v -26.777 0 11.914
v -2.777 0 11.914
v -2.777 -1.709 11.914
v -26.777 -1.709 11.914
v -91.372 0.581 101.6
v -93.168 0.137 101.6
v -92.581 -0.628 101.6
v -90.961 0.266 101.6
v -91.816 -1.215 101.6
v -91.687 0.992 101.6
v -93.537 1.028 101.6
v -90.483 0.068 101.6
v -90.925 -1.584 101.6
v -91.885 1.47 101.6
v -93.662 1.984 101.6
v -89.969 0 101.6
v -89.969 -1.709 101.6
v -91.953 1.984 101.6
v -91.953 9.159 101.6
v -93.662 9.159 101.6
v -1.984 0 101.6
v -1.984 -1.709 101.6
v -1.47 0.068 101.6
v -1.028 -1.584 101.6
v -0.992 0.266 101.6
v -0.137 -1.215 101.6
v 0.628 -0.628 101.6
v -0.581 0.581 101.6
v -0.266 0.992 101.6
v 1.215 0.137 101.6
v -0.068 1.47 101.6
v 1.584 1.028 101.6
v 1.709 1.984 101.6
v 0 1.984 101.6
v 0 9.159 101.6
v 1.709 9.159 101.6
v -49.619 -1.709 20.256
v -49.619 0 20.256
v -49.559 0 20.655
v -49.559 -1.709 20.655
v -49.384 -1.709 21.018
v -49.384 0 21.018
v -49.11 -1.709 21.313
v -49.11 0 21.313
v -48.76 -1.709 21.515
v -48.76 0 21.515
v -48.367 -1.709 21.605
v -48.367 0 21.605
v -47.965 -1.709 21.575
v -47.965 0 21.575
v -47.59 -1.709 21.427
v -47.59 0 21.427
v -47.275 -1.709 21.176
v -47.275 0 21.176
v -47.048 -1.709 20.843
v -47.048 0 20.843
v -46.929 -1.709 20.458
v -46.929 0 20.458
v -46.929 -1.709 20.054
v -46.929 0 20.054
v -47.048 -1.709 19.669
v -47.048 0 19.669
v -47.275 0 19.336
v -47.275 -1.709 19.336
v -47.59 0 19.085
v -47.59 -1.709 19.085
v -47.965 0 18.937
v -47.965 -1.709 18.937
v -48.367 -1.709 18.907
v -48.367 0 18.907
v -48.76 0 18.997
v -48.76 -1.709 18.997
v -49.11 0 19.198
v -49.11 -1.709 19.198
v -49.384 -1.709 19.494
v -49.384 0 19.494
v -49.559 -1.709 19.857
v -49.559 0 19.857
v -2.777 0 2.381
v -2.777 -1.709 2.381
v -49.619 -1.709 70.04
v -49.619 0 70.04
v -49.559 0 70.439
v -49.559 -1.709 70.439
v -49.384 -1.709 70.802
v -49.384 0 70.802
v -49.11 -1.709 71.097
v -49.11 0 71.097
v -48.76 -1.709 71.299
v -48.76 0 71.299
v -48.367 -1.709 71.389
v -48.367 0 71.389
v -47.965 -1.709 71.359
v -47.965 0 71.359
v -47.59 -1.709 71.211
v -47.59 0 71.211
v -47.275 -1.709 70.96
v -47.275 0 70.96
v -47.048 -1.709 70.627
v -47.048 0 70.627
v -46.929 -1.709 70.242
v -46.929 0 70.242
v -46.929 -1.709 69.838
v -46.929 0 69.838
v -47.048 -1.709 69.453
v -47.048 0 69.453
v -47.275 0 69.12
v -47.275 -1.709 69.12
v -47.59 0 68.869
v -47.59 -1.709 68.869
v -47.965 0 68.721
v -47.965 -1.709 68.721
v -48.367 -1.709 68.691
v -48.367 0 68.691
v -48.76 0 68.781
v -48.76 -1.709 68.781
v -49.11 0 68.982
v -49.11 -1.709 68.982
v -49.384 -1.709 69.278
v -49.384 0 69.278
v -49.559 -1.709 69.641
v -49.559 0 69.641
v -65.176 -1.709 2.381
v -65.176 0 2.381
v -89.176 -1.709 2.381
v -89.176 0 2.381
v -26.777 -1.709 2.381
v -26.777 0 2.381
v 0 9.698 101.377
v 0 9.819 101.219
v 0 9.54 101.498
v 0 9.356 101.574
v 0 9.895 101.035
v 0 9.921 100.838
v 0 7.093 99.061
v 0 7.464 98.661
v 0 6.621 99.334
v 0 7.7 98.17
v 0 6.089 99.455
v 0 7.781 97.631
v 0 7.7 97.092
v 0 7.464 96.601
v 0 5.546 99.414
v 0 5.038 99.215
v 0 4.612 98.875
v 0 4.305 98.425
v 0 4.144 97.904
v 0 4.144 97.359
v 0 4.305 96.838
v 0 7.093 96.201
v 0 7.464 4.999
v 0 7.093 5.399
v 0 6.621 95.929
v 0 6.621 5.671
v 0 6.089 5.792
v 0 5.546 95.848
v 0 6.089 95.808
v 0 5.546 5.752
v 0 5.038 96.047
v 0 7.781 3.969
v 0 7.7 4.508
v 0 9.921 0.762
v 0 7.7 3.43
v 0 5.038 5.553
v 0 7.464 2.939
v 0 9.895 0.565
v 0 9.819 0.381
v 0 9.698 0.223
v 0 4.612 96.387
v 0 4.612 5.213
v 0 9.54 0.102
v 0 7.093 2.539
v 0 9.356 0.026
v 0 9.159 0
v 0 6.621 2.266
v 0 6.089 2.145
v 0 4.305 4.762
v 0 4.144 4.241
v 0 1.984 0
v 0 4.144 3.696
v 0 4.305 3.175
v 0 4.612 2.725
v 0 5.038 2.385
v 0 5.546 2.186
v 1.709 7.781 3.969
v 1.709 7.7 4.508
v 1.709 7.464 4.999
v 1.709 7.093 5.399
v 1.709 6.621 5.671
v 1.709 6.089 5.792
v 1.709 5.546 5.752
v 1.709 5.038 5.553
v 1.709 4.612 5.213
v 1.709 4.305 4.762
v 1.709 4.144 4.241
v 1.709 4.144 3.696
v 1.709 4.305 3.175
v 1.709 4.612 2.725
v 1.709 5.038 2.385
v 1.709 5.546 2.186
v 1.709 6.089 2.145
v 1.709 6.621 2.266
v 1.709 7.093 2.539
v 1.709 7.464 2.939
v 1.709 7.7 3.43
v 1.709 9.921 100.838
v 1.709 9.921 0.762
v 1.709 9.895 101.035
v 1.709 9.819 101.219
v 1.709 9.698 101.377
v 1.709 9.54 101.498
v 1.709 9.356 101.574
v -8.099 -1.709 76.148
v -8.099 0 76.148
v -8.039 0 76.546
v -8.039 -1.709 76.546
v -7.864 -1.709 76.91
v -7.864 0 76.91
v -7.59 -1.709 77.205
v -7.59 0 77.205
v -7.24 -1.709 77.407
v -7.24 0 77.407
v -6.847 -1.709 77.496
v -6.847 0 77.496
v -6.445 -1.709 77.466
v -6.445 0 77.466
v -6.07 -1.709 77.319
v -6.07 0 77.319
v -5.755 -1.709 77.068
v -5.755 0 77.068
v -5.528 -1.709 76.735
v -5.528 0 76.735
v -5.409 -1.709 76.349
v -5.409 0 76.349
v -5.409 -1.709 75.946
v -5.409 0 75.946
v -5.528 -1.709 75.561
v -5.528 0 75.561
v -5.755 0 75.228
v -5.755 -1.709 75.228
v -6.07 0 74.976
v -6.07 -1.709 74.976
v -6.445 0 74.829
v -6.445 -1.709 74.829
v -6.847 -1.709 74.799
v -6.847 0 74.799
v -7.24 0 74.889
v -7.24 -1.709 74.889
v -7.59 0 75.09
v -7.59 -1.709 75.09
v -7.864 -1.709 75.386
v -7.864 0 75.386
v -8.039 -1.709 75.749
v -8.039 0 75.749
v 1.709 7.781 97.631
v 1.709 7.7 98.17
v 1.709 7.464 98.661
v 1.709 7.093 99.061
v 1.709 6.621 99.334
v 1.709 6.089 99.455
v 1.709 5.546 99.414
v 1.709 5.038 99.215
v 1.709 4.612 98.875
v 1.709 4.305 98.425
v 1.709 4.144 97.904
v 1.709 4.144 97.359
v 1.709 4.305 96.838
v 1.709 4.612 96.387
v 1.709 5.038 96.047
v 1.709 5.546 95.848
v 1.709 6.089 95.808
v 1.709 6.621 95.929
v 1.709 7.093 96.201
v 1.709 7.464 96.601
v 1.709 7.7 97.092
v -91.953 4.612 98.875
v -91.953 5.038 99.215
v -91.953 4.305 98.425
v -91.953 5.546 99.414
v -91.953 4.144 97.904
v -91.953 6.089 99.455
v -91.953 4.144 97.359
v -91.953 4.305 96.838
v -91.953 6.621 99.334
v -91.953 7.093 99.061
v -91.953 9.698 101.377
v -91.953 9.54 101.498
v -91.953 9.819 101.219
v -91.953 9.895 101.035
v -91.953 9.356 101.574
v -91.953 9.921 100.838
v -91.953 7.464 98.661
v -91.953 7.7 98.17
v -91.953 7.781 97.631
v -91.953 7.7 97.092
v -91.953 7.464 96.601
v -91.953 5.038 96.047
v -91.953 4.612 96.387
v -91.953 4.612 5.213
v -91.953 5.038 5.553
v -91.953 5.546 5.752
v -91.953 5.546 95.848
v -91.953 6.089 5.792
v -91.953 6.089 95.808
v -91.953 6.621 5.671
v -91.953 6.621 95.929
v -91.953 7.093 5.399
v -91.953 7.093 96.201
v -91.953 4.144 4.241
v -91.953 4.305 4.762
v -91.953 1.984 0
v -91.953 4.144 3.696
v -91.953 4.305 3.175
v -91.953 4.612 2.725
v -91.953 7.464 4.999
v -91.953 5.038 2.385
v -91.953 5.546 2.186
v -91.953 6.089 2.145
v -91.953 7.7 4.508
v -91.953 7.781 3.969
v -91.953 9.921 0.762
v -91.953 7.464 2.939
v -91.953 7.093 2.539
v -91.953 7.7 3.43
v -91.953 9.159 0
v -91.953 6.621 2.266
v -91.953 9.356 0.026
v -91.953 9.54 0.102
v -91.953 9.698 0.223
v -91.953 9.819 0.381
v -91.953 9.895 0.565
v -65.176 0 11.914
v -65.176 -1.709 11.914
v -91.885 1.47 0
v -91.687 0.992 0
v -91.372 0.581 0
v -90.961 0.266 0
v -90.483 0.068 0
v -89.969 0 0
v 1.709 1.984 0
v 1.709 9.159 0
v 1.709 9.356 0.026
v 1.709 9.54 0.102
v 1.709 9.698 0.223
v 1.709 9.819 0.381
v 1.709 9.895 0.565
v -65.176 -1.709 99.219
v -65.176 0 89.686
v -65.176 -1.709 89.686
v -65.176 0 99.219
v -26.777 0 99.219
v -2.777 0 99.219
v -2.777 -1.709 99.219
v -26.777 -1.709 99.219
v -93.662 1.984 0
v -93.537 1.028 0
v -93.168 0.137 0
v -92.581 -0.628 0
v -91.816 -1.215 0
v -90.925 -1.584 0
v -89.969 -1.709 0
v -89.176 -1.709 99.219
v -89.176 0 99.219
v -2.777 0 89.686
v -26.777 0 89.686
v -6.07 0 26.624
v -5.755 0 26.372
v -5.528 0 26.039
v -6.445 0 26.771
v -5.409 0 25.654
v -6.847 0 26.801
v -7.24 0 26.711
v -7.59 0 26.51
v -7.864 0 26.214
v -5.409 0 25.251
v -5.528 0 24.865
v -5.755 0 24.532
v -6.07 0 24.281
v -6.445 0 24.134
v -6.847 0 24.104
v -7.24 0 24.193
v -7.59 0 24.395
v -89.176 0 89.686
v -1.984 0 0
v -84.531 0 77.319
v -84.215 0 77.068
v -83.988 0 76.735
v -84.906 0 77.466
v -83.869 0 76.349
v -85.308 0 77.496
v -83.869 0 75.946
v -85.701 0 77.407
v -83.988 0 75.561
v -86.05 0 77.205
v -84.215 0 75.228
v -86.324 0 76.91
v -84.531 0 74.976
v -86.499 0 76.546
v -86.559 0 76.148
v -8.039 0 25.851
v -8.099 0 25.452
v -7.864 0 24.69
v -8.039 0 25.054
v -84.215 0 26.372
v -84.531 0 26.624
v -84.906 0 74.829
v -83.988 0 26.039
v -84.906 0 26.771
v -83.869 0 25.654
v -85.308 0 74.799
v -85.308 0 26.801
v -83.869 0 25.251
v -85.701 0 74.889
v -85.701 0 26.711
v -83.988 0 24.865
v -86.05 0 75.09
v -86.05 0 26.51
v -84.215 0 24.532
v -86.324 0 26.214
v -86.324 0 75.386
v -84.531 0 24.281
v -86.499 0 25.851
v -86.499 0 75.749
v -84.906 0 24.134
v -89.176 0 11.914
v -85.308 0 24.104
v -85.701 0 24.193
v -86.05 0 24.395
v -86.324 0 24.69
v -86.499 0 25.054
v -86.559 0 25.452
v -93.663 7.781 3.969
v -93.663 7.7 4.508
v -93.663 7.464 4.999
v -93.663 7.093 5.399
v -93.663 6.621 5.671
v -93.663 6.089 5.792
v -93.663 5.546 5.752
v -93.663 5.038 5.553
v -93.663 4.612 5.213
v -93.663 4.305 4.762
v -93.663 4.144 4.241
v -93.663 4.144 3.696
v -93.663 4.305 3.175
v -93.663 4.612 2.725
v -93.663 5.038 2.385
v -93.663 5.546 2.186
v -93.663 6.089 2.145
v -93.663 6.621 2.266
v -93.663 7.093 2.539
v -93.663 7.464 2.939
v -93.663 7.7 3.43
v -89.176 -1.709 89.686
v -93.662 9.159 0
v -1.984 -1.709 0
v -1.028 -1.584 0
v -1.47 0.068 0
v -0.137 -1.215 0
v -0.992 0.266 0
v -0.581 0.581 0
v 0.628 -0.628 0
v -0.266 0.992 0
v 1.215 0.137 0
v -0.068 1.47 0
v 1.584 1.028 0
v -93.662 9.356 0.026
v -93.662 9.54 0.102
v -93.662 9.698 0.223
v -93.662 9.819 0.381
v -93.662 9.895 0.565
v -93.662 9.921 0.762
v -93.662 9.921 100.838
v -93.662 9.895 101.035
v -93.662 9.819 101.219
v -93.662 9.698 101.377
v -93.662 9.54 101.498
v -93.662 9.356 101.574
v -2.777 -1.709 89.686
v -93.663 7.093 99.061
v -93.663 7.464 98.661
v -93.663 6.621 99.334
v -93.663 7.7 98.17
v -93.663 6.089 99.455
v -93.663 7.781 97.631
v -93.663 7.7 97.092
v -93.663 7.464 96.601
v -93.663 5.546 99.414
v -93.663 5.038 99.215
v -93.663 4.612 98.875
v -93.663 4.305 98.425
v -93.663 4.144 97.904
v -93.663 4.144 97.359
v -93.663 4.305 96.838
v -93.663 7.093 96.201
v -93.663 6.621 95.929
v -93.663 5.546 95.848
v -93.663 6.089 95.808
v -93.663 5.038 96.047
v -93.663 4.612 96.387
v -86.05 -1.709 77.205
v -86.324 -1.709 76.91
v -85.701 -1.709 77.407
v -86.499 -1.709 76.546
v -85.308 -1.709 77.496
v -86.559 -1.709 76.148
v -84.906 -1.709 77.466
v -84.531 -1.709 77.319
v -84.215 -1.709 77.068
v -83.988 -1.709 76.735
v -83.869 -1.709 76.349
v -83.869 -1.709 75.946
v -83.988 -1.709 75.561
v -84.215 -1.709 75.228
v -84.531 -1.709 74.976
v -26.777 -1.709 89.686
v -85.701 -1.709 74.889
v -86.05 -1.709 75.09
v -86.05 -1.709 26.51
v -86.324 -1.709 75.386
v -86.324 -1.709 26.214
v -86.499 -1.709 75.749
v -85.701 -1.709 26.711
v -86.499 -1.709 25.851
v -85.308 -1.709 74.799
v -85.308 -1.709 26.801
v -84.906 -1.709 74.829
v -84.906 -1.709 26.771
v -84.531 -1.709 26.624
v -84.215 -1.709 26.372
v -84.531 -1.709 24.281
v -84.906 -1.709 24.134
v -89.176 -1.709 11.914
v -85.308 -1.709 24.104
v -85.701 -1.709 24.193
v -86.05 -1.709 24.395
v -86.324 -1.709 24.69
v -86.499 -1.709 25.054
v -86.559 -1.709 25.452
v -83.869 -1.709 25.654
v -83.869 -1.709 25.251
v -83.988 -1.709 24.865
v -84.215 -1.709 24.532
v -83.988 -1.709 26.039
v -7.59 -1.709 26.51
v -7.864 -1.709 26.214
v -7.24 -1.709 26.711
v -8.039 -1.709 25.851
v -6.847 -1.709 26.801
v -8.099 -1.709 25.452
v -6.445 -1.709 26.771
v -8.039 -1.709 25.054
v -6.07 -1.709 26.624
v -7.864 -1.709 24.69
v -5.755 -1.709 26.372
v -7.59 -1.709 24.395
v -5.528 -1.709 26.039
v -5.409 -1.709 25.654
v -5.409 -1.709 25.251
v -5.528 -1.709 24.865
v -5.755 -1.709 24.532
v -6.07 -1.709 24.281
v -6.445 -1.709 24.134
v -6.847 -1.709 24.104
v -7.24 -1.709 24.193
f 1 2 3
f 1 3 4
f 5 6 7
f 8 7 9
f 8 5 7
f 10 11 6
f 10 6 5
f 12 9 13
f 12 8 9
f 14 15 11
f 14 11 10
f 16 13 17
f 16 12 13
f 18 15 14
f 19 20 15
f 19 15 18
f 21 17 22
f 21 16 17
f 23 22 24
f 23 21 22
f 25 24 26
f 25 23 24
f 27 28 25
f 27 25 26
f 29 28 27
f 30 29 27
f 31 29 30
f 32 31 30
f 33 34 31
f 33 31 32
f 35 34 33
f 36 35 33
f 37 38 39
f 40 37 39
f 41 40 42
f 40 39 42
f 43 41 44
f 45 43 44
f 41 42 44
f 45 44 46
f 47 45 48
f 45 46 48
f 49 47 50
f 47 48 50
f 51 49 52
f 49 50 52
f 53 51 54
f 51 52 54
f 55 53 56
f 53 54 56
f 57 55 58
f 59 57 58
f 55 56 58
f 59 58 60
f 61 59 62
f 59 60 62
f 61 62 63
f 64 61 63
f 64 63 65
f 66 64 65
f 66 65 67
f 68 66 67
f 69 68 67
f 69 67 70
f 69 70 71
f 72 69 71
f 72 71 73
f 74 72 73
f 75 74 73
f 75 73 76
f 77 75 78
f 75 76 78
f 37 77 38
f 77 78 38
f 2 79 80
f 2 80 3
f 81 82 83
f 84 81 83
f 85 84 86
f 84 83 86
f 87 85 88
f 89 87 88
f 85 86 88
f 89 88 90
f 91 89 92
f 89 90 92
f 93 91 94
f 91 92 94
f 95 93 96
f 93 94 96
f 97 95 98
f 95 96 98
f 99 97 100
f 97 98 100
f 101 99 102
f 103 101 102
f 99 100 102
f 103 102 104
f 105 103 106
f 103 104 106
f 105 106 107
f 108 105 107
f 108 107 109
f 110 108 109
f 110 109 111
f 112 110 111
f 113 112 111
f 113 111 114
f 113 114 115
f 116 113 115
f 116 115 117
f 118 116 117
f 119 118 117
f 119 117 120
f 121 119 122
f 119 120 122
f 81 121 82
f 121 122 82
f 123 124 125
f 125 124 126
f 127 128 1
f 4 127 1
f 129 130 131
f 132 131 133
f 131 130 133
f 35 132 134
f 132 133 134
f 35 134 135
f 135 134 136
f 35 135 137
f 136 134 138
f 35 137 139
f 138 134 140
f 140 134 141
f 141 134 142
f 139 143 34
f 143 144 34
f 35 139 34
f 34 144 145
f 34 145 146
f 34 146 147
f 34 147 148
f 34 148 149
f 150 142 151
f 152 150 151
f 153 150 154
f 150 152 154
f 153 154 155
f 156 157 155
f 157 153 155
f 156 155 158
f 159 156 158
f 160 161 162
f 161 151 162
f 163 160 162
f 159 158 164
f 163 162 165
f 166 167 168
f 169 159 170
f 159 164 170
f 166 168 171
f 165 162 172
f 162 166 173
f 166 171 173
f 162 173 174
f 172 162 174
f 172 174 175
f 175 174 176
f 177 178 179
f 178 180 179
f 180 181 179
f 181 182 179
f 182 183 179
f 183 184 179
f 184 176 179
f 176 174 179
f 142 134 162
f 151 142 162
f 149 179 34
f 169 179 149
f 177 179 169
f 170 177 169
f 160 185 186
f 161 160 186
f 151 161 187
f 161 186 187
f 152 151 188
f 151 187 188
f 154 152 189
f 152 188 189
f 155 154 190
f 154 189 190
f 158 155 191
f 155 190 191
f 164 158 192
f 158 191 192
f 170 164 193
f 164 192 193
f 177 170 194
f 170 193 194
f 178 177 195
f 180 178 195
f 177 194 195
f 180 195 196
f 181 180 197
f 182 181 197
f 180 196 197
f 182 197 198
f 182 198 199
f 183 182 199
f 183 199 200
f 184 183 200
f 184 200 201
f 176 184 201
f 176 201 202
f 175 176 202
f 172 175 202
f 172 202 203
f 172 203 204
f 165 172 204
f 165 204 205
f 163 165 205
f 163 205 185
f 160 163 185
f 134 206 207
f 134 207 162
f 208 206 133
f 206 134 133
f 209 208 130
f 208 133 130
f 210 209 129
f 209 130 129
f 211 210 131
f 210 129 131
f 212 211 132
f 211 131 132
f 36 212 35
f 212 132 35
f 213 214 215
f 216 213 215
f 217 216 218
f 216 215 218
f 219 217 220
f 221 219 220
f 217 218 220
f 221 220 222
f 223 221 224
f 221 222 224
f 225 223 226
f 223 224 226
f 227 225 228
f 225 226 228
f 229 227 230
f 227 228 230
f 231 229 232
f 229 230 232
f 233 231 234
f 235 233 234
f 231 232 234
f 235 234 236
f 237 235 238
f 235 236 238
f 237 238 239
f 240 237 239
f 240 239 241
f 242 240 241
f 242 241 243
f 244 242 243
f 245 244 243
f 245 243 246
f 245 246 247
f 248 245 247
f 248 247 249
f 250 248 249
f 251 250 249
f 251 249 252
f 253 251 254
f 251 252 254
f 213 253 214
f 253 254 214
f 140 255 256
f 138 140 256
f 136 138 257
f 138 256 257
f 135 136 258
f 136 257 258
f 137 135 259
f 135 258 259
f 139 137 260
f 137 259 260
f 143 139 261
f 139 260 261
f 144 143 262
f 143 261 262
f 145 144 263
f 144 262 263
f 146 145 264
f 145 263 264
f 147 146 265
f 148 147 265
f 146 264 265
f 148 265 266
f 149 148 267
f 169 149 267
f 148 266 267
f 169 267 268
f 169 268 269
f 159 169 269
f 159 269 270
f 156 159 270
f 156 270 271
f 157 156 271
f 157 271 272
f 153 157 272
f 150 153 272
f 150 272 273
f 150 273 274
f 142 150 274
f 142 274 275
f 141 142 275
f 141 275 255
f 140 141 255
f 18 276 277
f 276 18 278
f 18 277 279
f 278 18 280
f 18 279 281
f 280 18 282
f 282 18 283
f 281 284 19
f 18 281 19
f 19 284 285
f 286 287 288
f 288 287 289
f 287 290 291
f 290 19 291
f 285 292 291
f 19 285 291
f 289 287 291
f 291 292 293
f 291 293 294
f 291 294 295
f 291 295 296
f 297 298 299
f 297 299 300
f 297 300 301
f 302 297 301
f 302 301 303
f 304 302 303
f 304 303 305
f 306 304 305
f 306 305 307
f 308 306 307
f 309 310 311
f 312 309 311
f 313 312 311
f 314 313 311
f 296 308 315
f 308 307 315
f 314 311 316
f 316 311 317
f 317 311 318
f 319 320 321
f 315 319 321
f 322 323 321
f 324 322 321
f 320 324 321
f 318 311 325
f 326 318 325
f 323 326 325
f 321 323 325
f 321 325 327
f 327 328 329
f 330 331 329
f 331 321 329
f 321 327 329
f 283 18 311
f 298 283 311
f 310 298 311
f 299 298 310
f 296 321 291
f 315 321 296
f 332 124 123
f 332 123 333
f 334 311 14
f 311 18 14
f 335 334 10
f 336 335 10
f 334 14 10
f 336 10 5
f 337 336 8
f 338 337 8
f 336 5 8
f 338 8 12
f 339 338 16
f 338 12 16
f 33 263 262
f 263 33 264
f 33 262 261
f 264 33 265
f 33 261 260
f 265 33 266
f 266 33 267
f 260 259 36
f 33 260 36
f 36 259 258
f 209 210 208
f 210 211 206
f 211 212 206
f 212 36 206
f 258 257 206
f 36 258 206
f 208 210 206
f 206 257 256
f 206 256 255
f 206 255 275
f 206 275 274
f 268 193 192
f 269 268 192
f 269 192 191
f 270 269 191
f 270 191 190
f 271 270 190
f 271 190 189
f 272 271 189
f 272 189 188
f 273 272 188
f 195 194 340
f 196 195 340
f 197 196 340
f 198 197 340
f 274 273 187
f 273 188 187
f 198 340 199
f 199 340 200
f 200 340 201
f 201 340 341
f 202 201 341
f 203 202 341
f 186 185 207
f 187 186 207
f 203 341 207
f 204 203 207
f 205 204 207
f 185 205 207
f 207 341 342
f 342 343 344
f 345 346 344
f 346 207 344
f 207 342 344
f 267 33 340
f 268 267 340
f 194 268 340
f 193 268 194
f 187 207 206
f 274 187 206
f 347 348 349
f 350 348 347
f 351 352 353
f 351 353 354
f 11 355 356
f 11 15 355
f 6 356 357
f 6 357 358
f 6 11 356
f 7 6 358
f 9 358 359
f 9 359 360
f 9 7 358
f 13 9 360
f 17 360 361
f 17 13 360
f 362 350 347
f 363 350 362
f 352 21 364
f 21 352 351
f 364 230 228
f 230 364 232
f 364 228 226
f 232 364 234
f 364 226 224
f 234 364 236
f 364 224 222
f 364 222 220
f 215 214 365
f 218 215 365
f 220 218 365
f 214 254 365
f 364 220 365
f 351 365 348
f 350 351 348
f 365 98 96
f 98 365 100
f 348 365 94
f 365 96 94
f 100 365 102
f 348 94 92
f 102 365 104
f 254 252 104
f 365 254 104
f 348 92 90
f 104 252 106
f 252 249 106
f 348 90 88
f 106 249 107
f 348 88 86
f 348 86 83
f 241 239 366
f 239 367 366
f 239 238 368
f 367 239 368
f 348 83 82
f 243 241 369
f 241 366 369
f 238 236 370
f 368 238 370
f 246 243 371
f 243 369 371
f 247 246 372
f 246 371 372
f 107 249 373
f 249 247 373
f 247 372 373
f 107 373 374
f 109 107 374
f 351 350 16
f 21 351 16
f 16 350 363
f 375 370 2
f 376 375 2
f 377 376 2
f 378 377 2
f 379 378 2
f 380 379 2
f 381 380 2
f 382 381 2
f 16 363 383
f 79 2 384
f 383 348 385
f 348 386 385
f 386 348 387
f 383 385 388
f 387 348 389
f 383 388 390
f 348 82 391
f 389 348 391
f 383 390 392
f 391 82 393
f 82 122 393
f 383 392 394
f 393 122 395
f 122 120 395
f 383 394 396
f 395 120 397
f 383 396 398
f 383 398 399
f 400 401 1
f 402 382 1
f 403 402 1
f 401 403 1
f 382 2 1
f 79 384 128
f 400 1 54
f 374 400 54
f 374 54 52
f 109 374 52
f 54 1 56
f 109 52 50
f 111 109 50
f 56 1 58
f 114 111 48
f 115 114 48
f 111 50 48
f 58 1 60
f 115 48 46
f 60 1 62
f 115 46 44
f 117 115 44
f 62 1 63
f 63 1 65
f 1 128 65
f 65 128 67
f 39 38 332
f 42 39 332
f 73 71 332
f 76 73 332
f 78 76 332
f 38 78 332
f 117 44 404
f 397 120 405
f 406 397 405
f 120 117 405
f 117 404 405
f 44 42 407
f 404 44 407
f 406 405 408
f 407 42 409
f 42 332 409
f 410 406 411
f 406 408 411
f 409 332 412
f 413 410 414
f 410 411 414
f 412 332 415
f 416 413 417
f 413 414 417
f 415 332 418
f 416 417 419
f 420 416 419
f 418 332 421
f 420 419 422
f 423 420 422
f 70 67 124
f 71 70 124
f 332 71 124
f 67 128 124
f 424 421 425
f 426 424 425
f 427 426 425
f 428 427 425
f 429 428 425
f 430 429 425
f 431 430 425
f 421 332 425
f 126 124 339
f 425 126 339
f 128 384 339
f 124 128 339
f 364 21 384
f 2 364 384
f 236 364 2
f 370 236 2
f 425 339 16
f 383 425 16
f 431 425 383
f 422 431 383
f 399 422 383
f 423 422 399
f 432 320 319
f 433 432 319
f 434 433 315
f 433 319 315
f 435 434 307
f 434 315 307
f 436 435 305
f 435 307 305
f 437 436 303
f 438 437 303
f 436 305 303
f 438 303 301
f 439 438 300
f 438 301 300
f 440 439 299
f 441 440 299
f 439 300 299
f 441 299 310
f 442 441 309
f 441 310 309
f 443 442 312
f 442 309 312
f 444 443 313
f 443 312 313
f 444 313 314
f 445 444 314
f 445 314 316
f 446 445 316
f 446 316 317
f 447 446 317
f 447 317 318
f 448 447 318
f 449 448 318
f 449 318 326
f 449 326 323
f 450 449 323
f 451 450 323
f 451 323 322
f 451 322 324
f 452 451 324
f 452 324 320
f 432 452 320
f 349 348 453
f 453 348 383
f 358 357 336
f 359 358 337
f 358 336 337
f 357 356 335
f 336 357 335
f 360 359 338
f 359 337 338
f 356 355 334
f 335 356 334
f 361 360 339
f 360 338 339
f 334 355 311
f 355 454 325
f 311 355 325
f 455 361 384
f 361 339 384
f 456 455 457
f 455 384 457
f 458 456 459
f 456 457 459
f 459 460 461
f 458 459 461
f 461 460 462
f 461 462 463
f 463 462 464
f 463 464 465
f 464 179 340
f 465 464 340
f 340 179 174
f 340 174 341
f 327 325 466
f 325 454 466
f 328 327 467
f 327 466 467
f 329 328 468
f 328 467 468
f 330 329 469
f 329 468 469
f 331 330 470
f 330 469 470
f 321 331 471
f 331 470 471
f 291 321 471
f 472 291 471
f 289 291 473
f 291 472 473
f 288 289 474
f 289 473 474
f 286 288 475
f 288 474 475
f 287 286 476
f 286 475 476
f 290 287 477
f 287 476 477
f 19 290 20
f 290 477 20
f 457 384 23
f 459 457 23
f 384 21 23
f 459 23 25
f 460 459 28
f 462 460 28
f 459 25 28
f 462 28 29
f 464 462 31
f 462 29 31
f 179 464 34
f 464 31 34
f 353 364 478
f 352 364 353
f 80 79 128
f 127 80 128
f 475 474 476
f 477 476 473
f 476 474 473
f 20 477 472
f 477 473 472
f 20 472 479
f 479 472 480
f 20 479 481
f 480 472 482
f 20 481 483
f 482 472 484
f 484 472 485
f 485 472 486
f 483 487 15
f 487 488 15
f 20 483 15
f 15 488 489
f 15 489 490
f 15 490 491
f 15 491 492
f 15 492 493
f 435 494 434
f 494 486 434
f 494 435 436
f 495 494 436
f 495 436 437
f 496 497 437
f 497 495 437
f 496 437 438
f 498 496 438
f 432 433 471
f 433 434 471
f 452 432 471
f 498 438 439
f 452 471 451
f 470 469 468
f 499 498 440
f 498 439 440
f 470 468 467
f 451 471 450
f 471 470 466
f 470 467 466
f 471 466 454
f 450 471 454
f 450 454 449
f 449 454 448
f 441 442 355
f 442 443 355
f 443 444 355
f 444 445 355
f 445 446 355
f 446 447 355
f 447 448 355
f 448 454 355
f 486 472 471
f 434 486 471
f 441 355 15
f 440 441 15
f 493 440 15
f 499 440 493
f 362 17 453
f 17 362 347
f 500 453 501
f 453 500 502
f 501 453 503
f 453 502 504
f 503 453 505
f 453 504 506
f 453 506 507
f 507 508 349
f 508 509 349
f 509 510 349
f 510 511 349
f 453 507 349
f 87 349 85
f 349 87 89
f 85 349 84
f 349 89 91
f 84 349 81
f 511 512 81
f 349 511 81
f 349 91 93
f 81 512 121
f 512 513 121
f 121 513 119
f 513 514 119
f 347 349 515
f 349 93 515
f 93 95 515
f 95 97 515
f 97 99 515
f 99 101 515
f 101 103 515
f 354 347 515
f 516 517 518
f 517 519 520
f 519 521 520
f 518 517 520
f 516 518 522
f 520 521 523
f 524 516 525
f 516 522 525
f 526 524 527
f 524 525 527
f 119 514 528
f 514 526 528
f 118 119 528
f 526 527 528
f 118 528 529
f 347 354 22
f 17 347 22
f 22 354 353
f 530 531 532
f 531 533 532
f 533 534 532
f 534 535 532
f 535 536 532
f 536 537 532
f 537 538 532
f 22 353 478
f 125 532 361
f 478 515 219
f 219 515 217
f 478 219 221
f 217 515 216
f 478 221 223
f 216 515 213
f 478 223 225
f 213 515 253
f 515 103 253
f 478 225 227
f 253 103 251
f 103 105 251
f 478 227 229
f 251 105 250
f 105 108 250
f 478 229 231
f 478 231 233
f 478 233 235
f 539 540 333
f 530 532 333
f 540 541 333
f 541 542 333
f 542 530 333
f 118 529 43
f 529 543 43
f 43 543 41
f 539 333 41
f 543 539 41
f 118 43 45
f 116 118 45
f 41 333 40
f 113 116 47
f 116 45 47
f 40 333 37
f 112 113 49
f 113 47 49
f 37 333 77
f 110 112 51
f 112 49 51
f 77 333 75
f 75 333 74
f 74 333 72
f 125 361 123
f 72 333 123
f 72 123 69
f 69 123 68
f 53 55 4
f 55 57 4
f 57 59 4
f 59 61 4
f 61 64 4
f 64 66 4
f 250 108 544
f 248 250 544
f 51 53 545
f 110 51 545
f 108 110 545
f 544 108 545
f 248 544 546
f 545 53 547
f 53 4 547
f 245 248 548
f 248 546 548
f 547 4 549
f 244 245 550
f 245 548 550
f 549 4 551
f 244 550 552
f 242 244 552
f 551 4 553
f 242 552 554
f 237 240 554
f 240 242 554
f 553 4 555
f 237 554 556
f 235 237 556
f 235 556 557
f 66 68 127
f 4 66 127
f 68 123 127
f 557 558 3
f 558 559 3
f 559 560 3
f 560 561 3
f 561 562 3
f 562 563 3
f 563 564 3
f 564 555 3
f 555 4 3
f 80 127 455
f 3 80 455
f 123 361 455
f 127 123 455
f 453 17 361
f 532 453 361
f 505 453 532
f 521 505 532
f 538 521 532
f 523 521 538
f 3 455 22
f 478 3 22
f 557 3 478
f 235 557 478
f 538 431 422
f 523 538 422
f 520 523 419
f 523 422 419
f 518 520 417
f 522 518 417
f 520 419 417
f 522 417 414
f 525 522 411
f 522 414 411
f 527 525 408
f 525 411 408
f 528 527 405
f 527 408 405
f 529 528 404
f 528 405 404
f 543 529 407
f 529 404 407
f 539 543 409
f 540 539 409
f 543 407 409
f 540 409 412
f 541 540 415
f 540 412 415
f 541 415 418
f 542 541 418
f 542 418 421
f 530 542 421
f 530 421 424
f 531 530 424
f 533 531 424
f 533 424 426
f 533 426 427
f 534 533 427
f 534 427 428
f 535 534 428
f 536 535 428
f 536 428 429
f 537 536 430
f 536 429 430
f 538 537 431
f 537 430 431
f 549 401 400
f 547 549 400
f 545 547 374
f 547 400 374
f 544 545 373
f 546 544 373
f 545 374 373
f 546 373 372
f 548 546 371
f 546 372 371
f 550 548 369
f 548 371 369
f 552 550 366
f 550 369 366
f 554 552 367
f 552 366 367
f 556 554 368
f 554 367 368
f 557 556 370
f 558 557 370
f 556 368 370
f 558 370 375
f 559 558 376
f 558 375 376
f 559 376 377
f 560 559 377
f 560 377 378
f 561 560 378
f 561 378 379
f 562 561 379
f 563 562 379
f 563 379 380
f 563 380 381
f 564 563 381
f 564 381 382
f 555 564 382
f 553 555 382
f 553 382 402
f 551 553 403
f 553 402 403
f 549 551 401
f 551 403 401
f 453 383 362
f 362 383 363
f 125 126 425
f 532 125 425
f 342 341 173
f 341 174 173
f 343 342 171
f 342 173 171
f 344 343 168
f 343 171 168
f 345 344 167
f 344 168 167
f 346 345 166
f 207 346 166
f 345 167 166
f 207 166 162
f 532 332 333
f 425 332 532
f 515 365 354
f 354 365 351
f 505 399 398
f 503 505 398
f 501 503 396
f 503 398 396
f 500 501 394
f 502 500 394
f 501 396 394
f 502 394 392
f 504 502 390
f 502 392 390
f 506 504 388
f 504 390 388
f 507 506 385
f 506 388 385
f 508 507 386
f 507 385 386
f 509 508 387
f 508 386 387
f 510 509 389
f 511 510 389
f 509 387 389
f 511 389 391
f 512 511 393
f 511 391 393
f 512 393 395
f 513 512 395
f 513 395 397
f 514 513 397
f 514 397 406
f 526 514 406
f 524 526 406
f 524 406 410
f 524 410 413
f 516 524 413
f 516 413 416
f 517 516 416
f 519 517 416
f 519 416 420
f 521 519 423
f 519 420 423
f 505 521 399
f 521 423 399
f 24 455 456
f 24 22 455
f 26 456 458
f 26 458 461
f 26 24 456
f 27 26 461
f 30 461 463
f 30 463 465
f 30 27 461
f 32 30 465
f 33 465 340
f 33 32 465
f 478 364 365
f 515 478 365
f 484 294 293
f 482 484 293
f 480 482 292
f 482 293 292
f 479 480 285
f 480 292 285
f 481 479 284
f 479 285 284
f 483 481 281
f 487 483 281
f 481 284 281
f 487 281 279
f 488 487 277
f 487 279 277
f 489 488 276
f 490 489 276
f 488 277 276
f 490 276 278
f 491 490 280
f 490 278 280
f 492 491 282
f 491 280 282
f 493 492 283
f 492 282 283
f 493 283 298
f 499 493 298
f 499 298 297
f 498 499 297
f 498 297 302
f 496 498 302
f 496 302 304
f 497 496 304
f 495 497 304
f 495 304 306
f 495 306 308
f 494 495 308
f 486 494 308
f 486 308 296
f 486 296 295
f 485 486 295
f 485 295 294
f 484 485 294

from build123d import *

# Parameters (mm, degrees)
F1_DEPTH  = 101.6
F2_R      = 3.69316
F3_R      = 1.98374
F4_W      = 24
F4_H      = 9.5329248
F4_R      = 1.35255
F5_DEPTH  = 1.70942
F6_R      = 1.8288
F7_DEPTH  = 95.37192
F8_R      = 0.762
F9_R      = 1.35255
F10_DEPTH = 1.70942


with BuildPart() as f1:
    # F0 (on Top) → F1 (new body)
    with BuildSketch(Plane.XY):
        Polygon((0, 9.92124), (0, 0), (-91.95308, 0), (-91.95308, 9.92124), (-93.6625, 9.92124), (-93.6625, -1.70942), (1.70942, -1.70942), (1.70942, 9.92124), align=None)
    extrude(amount=F1_DEPTH)

    # F2
    f2_edges = [f1.edges().sort_by_distance(p)[0] for p in [
        (1.70942, -1.70942, 50.8),
        (-93.6625, -1.70942, 50.8),
    ]]
    fillet(f2_edges, radius=F2_R)

    # F3
    f3_edges = [f1.edges().sort_by_distance(p)[0] for p in [
        (0, 0, 50.8),
        (-91.95308, 0, 50.8),
    ]]
    fillet(f3_edges, radius=F3_R)

    # F4 (on face) → F5 (cut, through all)
    with BuildSketch(Plane(origin=(0, 0, 0), x_dir=(-1, 0, 0), z_dir=(0, 1, 0))):
        with Locations((77.17559, 94.4522876)):
            Rectangle(F4_W, F4_H)
        with Locations((77.17559, 7.1477124)):
            Rectangle(F4_W, F4_H)
        with Locations((14.77749, 7.1477124)):
            Rectangle(F4_W, F4_H)
        with Locations((14.77749, 94.4522876)):
            Rectangle(F4_W, F4_H)
        with Locations((85.20684, 76.1477196107)):
            Circle(F4_R)
        with Locations((85.20684, 25.4522803893)):
            Circle(F4_R)
        with Locations((6.74624, 25.4522803893)):
            Circle(F4_R)
        with Locations((6.74624, 76.1477196107)):
            Circle(F4_R)
    extrude(amount=-F5_DEPTH, mode=Mode.SUBTRACT)

    # F6 (on face) → F7 (cut, through all)
    with BuildSketch(Plane.YZ.offset(1.70942)):
        with Locations((5.95249, 97.63125)):
            Circle(F6_R)
        with Locations((5.95249, 3.96875)):
            Circle(F6_R)
    extrude(amount=-F7_DEPTH, mode=Mode.SUBTRACT)

    # F8
    f8_edges = [f1.edges().sort_by_distance(p)[0] for p in [
        (-92.80779, 9.92124, 101.6),
        (-92.80779, 9.92124, 0),
        (0.85471, 9.92124, 0),
        (0.85471, 9.92124, 101.6),
    ]]
    fillet(f8_edges, radius=F8_R)

    # F9 (on face) → F10 (cut, through all)
    with BuildSketch(Plane(origin=(0, 0, 0), x_dir=(-1, 0, 0), z_dir=(0, 1, 0))):
        with Locations((48.26635, 70.0399442418)):
            Circle(F9_R)
        with Locations((48.26635, 20.2559442418)):
            Circle(F9_R)
    extrude(amount=-F10_DEPTH, mode=Mode.SUBTRACT)


solid = f1.part
